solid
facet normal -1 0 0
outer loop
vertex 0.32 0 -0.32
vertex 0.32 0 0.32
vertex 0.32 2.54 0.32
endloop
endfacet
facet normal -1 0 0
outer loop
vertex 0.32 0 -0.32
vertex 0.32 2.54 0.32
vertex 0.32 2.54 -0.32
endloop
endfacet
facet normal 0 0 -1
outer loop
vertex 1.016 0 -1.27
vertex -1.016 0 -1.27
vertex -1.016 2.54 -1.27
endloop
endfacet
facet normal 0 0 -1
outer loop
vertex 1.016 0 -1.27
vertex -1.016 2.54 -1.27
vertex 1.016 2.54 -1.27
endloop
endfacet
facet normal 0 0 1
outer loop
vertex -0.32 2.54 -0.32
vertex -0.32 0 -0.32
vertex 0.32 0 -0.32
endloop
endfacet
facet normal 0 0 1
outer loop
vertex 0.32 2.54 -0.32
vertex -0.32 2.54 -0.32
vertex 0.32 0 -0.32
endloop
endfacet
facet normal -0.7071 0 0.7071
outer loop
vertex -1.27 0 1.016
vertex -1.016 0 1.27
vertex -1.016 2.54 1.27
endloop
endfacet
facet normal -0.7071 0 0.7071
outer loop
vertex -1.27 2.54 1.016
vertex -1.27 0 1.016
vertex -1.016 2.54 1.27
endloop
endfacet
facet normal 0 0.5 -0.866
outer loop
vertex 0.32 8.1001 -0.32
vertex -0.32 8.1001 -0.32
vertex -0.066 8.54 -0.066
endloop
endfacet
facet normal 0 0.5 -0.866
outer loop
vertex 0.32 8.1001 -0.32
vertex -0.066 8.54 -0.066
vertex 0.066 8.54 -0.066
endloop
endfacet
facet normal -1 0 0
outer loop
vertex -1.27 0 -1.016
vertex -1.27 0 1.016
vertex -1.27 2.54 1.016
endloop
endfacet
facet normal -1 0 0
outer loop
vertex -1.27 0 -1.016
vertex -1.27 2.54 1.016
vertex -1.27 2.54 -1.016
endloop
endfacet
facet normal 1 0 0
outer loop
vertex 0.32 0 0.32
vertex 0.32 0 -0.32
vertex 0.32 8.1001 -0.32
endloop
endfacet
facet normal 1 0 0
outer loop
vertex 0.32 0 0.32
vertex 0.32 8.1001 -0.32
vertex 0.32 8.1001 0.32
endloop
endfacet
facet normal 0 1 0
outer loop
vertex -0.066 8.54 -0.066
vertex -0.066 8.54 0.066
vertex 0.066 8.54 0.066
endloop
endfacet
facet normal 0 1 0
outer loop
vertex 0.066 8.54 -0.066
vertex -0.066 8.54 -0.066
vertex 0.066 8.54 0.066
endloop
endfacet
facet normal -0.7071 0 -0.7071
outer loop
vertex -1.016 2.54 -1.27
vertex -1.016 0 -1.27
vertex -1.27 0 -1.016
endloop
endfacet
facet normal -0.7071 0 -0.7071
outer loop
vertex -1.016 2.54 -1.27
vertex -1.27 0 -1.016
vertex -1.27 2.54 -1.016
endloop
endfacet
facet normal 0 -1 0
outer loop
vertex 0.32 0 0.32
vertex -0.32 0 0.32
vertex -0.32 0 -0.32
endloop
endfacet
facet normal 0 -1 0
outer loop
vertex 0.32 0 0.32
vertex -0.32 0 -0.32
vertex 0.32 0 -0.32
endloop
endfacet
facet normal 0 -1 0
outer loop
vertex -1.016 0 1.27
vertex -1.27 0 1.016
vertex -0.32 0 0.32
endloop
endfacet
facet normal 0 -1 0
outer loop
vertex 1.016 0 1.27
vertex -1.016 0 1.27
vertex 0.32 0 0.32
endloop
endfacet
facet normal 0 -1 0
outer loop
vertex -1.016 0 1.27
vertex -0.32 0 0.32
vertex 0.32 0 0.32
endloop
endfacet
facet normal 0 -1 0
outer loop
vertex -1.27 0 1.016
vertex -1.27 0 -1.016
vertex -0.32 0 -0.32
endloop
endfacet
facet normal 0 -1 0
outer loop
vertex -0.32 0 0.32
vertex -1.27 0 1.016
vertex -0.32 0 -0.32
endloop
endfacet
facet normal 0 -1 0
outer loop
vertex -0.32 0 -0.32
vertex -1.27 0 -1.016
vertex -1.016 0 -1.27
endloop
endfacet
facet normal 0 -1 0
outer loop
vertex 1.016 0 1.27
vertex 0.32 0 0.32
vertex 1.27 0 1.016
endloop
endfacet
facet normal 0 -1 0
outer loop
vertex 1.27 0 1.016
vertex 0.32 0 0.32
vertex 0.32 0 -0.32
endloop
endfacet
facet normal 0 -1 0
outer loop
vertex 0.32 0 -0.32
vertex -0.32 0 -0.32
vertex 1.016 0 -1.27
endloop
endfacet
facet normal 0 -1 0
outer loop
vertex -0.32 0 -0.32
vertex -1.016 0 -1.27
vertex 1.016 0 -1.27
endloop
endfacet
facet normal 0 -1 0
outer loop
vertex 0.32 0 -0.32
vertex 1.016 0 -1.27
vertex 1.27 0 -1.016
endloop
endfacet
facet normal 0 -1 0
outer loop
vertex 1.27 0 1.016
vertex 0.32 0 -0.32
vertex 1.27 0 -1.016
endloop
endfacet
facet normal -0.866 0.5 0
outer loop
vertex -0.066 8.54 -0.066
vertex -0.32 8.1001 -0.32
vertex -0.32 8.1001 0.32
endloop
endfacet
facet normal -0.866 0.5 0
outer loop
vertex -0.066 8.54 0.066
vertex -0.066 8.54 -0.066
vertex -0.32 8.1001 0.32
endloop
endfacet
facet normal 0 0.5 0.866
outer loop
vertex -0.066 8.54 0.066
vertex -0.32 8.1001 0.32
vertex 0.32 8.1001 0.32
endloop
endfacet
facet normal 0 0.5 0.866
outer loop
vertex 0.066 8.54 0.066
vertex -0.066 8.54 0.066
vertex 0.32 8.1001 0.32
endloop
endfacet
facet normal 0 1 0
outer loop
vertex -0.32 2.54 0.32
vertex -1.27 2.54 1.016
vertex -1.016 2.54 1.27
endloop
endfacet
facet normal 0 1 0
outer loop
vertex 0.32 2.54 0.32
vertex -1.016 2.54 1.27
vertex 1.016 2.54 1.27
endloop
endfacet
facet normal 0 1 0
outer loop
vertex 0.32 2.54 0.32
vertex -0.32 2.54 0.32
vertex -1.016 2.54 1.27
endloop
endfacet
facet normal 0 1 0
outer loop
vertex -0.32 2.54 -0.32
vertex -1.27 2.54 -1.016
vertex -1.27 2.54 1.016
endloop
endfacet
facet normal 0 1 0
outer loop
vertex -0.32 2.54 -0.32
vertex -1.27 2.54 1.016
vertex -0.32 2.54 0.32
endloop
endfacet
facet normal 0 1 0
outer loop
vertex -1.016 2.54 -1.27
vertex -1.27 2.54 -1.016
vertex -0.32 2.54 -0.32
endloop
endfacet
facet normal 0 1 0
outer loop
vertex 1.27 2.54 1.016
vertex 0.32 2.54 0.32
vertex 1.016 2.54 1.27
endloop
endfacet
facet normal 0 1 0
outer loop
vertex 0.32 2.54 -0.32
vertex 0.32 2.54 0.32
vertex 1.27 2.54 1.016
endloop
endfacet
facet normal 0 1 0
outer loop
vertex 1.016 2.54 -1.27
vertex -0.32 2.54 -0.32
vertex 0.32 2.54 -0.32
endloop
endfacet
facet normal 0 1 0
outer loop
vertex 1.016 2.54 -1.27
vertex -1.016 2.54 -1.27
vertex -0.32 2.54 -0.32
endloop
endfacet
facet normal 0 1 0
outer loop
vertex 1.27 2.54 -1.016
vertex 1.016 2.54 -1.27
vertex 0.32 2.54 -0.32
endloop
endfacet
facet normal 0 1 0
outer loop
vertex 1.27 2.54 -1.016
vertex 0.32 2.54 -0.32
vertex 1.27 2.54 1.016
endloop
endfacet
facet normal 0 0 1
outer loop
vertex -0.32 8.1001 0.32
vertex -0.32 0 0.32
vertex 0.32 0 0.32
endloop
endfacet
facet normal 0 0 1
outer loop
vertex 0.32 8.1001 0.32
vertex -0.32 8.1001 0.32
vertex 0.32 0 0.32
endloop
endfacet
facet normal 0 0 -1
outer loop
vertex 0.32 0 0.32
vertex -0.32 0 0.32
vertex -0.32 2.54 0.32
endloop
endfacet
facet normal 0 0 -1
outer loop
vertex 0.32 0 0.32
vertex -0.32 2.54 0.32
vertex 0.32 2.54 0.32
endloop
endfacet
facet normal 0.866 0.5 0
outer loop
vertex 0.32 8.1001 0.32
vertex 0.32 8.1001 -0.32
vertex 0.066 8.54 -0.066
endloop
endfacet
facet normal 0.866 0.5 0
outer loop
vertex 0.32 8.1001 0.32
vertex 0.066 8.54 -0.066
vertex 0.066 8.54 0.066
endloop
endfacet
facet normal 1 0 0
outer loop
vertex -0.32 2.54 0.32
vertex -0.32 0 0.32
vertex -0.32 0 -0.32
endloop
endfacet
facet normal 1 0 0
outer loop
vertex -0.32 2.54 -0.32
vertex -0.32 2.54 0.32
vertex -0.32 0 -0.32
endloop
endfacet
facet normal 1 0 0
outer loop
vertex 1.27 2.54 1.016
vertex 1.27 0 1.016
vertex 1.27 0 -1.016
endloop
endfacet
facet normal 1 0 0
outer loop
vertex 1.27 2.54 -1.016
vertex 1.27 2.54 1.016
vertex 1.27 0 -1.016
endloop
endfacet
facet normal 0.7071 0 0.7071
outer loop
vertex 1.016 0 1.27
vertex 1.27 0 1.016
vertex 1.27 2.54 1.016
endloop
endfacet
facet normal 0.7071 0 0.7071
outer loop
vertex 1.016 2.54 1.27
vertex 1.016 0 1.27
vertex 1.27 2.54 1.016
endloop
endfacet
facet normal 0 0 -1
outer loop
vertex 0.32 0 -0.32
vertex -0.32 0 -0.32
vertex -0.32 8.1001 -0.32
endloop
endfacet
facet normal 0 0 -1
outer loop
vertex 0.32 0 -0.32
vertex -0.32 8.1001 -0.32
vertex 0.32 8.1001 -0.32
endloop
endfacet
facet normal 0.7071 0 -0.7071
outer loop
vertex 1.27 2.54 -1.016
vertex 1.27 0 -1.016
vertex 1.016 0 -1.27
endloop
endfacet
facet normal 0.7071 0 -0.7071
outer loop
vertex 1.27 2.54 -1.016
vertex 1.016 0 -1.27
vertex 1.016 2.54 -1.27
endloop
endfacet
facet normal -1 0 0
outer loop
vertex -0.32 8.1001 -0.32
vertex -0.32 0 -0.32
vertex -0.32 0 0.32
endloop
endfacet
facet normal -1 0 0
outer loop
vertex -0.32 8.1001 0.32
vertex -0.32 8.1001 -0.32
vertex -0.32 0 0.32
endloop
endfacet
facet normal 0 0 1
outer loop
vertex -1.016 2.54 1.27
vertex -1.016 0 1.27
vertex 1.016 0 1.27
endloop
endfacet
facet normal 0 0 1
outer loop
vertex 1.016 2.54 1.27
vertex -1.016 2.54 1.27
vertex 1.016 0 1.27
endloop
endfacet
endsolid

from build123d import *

# Parameters (mm, degrees)
SKETCH1_W           = 2.54
SKETCH1_H           = 2.54
SKETCH1_W_2         = 0.64
SKETCH1_H_2         = 0.64
BOSS_EXTRUDE1_DEPTH = 2.54
CHAMFER1_SIZE       = 0.254
SKETCH2_W           = 0.64
SKETCH2_H           = 0.64
BOSS_EXTRUDE2_DEPTH = 8.539999938
CHAMFER2_SIZE       = 0.254
CHAMFER2_SIZE2      = 0.439940905


with BuildPart() as part:
    # Sketch1 → Boss-Extrude1 (new body)
    with BuildSketch(Plane(origin=(0, 0, 0), x_dir=(1, 0, 0), z_dir=(0, 1, 0))):
        Rectangle(SKETCH1_W, SKETCH1_H)
        Rectangle(SKETCH1_W_2, SKETCH1_H_2, mode=Mode.SUBTRACT)
    extrude(amount=BOSS_EXTRUDE1_DEPTH)

    # Chamfer1
    chamfer1_edges = [part.edges().sort_by_distance(p)[0] for p in [
        (-1.27, 1.27, -1.27),
        (1.27, 1.27, -1.27),
        (1.27, 1.27, 1.27),
        (-1.27, 1.27, 1.27),
    ]]
    chamfer(chamfer1_edges, length=CHAMFER1_SIZE)


with BuildPart() as body_2:
    # Sketch2 → Boss-Extrude2 (new body)
    with BuildSketch(Plane.XZ):
        Rectangle(SKETCH2_W, SKETCH2_H)
    extrude(amount=-BOSS_EXTRUDE2_DEPTH)

    # Chamfer2
    chamfer2_edges = [body_2.edges().sort_by_distance(p)[0] for p in [
        (0.32, 8.539999938, 0),
        (0, 8.539999938, 0.32),
        (-0.32, 8.539999938, 0),
        (0, 8.539999938, -0.32),
    ]]
    chamfer2_side = [body_2.faces().sort_by_distance(p)[0] for p in [
        (0, 8.539999938, 0),
    ]]
    chamfer(chamfer2_edges, length=CHAMFER2_SIZE, length2=CHAMFER2_SIZE2, reference=chamfer2_side[0])


solid = Compound([part.part, body_2.part])
